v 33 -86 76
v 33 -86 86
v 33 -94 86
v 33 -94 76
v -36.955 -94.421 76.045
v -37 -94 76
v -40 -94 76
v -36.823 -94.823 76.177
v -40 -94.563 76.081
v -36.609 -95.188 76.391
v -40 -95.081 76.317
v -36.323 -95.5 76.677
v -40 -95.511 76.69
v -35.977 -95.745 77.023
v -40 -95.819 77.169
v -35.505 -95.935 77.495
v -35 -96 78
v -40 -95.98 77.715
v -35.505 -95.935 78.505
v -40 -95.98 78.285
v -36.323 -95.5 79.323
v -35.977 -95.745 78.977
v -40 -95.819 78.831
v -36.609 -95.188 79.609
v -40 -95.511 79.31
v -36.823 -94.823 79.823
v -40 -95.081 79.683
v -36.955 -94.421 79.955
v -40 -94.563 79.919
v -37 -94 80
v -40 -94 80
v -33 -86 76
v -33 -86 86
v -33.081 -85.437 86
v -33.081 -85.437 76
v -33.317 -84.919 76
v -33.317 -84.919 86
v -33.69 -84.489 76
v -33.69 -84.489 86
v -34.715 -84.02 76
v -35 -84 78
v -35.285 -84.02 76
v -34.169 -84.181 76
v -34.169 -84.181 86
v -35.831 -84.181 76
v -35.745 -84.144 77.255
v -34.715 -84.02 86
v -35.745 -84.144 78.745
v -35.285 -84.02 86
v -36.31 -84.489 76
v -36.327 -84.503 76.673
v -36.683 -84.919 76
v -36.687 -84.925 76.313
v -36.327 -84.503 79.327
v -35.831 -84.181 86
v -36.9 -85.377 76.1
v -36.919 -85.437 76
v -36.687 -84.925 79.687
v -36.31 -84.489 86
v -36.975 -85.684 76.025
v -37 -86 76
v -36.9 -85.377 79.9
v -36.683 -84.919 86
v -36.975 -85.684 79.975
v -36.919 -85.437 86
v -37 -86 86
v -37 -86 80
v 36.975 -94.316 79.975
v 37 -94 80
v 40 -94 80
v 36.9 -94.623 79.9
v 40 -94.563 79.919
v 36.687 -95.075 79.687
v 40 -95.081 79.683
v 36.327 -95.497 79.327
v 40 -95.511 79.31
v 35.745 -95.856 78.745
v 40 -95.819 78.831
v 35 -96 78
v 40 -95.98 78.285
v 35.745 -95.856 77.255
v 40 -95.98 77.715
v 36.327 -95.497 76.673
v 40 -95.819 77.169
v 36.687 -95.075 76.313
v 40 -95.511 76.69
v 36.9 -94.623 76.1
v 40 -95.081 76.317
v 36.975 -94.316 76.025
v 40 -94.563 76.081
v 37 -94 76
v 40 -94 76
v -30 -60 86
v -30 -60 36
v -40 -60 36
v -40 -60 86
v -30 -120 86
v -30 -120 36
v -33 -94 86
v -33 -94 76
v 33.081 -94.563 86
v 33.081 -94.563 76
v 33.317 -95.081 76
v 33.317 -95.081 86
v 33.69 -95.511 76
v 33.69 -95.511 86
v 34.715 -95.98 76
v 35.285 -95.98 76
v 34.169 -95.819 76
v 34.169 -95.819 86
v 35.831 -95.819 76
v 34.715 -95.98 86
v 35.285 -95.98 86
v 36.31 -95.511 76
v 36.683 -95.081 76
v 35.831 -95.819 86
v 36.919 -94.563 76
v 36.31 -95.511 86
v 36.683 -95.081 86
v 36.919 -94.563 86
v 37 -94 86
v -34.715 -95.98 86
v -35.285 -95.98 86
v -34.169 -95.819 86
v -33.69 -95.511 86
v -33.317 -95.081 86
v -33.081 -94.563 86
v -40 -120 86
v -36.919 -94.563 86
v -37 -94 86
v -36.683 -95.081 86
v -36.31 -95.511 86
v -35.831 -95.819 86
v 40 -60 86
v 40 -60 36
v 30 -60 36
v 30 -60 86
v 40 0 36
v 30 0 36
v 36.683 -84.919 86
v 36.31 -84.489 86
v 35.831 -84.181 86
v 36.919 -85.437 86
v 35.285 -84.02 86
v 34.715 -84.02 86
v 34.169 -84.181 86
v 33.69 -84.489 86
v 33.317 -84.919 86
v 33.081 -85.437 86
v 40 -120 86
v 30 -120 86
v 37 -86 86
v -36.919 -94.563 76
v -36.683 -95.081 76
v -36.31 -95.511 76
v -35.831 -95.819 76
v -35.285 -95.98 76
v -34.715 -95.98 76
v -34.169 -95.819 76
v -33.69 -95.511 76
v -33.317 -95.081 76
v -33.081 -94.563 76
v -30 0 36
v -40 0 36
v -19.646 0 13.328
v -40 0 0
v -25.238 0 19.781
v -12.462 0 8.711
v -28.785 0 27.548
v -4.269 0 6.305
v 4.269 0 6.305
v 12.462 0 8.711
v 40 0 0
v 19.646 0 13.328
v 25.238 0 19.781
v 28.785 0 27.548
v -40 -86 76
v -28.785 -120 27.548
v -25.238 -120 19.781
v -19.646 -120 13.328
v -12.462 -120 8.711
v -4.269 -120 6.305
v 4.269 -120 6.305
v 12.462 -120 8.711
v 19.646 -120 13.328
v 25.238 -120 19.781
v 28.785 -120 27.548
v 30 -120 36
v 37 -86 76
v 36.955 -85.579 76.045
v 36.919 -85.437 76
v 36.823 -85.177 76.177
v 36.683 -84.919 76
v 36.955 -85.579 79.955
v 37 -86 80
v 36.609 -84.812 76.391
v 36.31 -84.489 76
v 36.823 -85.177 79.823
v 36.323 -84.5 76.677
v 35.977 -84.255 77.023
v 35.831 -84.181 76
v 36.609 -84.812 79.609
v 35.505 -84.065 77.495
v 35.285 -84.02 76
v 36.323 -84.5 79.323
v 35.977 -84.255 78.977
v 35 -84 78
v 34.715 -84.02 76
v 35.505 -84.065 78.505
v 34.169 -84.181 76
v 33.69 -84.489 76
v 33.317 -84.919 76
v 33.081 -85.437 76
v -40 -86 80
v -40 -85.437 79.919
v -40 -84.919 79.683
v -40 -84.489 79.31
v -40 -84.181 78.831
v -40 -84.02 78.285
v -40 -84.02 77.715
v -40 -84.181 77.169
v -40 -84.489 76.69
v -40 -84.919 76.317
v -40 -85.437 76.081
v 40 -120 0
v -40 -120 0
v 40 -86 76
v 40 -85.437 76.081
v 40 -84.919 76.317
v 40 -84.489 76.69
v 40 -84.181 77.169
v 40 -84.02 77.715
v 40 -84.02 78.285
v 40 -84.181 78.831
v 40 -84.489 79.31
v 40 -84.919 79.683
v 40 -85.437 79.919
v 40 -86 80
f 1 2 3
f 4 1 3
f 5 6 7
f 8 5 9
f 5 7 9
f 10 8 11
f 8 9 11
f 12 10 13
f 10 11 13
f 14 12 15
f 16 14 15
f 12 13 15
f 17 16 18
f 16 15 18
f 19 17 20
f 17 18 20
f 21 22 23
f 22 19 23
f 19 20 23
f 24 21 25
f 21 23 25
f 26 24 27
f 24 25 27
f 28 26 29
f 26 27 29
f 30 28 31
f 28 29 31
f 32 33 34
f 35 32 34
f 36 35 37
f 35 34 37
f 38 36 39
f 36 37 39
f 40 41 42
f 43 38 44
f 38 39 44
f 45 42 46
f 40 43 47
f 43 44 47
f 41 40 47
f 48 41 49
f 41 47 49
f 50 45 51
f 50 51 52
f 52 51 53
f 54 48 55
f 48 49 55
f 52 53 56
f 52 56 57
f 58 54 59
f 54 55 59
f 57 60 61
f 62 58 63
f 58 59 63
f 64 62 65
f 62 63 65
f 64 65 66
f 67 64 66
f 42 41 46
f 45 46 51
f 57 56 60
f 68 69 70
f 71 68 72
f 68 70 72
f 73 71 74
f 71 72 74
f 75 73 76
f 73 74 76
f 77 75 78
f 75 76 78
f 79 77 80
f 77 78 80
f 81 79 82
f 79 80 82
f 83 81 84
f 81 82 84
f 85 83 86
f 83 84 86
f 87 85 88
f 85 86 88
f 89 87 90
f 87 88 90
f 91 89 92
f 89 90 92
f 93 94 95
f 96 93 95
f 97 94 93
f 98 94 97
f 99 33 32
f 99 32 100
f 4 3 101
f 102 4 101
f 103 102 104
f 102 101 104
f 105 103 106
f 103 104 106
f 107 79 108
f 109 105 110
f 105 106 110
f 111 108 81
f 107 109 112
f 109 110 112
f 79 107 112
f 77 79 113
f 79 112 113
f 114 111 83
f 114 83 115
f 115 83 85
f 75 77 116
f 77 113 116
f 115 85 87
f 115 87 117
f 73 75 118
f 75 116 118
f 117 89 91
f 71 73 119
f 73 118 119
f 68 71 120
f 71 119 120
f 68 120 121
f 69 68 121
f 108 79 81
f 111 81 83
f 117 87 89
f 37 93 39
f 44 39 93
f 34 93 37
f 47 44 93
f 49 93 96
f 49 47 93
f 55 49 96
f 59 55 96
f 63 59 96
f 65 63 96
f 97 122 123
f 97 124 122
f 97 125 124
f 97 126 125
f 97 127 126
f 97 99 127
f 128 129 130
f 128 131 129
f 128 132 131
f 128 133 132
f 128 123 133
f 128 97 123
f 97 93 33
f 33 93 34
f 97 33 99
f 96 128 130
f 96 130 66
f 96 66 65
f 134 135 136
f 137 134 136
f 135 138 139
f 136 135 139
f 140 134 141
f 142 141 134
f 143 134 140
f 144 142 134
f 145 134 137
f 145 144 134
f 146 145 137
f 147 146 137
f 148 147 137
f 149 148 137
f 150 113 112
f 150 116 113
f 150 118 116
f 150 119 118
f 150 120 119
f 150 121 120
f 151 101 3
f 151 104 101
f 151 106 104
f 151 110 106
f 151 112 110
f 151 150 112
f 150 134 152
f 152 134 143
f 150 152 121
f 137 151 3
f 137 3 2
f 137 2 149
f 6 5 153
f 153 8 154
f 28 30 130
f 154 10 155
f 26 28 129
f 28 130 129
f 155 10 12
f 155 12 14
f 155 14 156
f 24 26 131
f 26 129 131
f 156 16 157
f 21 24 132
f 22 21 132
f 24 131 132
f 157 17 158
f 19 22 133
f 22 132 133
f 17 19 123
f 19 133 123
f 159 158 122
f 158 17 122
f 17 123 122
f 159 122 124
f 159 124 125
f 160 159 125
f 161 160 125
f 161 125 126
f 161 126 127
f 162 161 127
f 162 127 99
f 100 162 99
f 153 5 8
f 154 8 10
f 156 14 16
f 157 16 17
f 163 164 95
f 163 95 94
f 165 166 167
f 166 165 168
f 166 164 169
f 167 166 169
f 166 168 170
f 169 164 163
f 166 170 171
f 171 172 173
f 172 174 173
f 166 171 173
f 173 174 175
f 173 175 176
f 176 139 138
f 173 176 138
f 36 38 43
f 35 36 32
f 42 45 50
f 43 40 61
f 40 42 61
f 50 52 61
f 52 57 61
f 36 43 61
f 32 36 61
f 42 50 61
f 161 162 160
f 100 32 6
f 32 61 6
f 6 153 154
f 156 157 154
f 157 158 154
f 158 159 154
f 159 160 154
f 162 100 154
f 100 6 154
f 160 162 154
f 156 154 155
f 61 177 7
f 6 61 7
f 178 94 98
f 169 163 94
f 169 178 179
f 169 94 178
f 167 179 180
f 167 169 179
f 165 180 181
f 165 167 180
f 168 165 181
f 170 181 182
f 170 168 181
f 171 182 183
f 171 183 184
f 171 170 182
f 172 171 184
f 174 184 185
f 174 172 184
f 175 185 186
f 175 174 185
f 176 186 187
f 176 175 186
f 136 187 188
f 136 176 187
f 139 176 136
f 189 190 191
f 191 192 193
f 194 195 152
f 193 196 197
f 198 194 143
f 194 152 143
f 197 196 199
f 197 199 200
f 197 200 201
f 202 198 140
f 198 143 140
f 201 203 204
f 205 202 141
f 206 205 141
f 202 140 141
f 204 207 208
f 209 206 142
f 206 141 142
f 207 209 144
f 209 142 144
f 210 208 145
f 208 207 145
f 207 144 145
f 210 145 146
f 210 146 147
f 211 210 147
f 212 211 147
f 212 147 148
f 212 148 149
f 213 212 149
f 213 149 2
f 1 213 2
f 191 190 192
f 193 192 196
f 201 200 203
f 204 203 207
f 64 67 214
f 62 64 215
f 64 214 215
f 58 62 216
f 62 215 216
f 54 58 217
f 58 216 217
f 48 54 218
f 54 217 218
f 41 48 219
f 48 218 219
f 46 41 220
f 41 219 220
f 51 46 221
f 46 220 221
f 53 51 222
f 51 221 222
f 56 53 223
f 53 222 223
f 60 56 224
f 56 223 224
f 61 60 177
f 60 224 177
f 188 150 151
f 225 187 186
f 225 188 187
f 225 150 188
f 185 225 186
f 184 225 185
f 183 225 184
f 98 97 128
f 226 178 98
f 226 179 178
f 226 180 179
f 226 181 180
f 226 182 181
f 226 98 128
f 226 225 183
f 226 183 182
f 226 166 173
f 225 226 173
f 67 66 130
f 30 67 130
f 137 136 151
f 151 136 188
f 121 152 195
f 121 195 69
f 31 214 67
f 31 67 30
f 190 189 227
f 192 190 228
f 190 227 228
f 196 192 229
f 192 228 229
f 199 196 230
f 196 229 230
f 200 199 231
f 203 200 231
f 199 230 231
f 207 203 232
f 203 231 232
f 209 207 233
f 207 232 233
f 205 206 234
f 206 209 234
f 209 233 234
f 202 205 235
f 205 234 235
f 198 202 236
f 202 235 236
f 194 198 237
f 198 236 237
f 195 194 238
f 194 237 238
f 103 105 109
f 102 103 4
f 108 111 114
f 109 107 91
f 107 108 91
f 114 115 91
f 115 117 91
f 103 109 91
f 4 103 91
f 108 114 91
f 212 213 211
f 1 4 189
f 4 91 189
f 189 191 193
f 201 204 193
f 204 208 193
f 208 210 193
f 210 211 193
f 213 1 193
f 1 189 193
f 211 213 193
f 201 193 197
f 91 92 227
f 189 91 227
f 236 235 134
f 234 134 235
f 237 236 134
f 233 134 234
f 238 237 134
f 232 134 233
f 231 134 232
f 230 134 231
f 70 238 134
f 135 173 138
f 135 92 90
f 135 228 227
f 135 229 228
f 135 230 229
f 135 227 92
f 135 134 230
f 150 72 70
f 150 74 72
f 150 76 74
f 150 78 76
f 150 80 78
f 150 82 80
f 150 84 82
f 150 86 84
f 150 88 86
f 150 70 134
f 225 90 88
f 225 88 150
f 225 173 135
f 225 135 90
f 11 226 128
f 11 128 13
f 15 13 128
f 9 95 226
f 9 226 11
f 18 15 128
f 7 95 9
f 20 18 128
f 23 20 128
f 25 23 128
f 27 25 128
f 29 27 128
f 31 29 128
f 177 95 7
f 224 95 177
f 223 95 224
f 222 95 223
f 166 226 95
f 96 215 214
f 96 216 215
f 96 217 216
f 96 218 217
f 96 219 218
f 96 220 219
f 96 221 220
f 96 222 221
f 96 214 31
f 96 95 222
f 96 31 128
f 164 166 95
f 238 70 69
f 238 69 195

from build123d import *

# Parameters (mm, degrees)
PAD_DEPTH       = 120
SKETCH001_W     = 10
SKETCH001_H     = 60
PAD001_DEPTH    = 50
POCKET_DEPTH    = 10
POCKET001_DEPTH = 5
POCKET002_DEPTH = 5


with BuildPart() as part:
    # Sketch → Pad (new body)
    with BuildSketch(Plane.XZ):
        with BuildLine():
            Line((-40, 0), (40, 0))
            Line((40, 0), (40, 36))
            Line((40, 36), (30, 36))
            ThreePointArc((-30, 36), (0, 6), (30, 36))
            Line((-40, 36), (-30, 36))
            Line((-40, 0), (-40, 36))
        make_face()
    extrude(amount=PAD_DEPTH)

    # Sketch001 (on Face5 of Pad) → Pad001 (join)
    with BuildSketch(Plane(origin=(0, 0, 36), x_dir=(-1, 0, 0), z_dir=(0, 0, 1))):
        with Locations((-35, 90)):
            Rectangle(SKETCH001_W, SKETCH001_H)
        with Locations((35, 90)):
            Rectangle(SKETCH001_W, SKETCH001_H)
    extrude(amount=PAD001_DEPTH)

    # Sketch002 (on Face14 of Pad001) → Pocket (cut)
    with BuildSketch(Plane(origin=(0, 0, 86), x_dir=(-1, 0, 0), z_dir=(0, 0, 1))):
        with BuildLine():
            ThreePointArc((33, 86), (35, 84), (37, 86))
            Line((37, 86), (37, 94))
            ThreePointArc((37, 94), (35, 96), (33, 94))
            Line((33, 86), (33, 94))
        make_face()
        with BuildLine():
            ThreePointArc((-37, 86), (-35, 84), (-33, 86))
            Line((-33, 86), (-33, 94))
            ThreePointArc((-33, 94), (-35, 96), (-37, 94))
            Line((-37, 86), (-37, 94))
        make_face()
    extrude(amount=-POCKET_DEPTH, mode=Mode.SUBTRACT)

    # Sketch003 (on Face7 of Pocket) → Pocket001 (cut)
    with BuildSketch(Plane(origin=(-40, 0, 0), x_dir=(0, 0, -1), z_dir=(-1, 0, 0))):
        with BuildLine():
            ThreePointArc((-80, 86), (-78, 84), (-76, 86))
            Line((-76, 86), (-76, 94))
            ThreePointArc((-76, 94), (-78, 96), (-80, 94))
            Line((-80, 86), (-80, 94))
        make_face()
    extrude(amount=-POCKET001_DEPTH, mode=Mode.SUBTRACT)

    # Sketch004 (on Face9 of Pocket001) → Pocket002 (cut)
    with BuildSketch(Plane(origin=(40, 0, 0), x_dir=(0, 0, 1), z_dir=(1, 0, 0))):
        with BuildLine():
            ThreePointArc((80, 94), (78, 96), (76, 94))
            Line((76, 94), (76, 86))
            ThreePointArc((76, 86), (78, 84), (80, 86))
            Line((80, 94), (80, 86))
        make_face()
    extrude(amount=-POCKET002_DEPTH, mode=Mode.SUBTRACT)


solid = part.part
